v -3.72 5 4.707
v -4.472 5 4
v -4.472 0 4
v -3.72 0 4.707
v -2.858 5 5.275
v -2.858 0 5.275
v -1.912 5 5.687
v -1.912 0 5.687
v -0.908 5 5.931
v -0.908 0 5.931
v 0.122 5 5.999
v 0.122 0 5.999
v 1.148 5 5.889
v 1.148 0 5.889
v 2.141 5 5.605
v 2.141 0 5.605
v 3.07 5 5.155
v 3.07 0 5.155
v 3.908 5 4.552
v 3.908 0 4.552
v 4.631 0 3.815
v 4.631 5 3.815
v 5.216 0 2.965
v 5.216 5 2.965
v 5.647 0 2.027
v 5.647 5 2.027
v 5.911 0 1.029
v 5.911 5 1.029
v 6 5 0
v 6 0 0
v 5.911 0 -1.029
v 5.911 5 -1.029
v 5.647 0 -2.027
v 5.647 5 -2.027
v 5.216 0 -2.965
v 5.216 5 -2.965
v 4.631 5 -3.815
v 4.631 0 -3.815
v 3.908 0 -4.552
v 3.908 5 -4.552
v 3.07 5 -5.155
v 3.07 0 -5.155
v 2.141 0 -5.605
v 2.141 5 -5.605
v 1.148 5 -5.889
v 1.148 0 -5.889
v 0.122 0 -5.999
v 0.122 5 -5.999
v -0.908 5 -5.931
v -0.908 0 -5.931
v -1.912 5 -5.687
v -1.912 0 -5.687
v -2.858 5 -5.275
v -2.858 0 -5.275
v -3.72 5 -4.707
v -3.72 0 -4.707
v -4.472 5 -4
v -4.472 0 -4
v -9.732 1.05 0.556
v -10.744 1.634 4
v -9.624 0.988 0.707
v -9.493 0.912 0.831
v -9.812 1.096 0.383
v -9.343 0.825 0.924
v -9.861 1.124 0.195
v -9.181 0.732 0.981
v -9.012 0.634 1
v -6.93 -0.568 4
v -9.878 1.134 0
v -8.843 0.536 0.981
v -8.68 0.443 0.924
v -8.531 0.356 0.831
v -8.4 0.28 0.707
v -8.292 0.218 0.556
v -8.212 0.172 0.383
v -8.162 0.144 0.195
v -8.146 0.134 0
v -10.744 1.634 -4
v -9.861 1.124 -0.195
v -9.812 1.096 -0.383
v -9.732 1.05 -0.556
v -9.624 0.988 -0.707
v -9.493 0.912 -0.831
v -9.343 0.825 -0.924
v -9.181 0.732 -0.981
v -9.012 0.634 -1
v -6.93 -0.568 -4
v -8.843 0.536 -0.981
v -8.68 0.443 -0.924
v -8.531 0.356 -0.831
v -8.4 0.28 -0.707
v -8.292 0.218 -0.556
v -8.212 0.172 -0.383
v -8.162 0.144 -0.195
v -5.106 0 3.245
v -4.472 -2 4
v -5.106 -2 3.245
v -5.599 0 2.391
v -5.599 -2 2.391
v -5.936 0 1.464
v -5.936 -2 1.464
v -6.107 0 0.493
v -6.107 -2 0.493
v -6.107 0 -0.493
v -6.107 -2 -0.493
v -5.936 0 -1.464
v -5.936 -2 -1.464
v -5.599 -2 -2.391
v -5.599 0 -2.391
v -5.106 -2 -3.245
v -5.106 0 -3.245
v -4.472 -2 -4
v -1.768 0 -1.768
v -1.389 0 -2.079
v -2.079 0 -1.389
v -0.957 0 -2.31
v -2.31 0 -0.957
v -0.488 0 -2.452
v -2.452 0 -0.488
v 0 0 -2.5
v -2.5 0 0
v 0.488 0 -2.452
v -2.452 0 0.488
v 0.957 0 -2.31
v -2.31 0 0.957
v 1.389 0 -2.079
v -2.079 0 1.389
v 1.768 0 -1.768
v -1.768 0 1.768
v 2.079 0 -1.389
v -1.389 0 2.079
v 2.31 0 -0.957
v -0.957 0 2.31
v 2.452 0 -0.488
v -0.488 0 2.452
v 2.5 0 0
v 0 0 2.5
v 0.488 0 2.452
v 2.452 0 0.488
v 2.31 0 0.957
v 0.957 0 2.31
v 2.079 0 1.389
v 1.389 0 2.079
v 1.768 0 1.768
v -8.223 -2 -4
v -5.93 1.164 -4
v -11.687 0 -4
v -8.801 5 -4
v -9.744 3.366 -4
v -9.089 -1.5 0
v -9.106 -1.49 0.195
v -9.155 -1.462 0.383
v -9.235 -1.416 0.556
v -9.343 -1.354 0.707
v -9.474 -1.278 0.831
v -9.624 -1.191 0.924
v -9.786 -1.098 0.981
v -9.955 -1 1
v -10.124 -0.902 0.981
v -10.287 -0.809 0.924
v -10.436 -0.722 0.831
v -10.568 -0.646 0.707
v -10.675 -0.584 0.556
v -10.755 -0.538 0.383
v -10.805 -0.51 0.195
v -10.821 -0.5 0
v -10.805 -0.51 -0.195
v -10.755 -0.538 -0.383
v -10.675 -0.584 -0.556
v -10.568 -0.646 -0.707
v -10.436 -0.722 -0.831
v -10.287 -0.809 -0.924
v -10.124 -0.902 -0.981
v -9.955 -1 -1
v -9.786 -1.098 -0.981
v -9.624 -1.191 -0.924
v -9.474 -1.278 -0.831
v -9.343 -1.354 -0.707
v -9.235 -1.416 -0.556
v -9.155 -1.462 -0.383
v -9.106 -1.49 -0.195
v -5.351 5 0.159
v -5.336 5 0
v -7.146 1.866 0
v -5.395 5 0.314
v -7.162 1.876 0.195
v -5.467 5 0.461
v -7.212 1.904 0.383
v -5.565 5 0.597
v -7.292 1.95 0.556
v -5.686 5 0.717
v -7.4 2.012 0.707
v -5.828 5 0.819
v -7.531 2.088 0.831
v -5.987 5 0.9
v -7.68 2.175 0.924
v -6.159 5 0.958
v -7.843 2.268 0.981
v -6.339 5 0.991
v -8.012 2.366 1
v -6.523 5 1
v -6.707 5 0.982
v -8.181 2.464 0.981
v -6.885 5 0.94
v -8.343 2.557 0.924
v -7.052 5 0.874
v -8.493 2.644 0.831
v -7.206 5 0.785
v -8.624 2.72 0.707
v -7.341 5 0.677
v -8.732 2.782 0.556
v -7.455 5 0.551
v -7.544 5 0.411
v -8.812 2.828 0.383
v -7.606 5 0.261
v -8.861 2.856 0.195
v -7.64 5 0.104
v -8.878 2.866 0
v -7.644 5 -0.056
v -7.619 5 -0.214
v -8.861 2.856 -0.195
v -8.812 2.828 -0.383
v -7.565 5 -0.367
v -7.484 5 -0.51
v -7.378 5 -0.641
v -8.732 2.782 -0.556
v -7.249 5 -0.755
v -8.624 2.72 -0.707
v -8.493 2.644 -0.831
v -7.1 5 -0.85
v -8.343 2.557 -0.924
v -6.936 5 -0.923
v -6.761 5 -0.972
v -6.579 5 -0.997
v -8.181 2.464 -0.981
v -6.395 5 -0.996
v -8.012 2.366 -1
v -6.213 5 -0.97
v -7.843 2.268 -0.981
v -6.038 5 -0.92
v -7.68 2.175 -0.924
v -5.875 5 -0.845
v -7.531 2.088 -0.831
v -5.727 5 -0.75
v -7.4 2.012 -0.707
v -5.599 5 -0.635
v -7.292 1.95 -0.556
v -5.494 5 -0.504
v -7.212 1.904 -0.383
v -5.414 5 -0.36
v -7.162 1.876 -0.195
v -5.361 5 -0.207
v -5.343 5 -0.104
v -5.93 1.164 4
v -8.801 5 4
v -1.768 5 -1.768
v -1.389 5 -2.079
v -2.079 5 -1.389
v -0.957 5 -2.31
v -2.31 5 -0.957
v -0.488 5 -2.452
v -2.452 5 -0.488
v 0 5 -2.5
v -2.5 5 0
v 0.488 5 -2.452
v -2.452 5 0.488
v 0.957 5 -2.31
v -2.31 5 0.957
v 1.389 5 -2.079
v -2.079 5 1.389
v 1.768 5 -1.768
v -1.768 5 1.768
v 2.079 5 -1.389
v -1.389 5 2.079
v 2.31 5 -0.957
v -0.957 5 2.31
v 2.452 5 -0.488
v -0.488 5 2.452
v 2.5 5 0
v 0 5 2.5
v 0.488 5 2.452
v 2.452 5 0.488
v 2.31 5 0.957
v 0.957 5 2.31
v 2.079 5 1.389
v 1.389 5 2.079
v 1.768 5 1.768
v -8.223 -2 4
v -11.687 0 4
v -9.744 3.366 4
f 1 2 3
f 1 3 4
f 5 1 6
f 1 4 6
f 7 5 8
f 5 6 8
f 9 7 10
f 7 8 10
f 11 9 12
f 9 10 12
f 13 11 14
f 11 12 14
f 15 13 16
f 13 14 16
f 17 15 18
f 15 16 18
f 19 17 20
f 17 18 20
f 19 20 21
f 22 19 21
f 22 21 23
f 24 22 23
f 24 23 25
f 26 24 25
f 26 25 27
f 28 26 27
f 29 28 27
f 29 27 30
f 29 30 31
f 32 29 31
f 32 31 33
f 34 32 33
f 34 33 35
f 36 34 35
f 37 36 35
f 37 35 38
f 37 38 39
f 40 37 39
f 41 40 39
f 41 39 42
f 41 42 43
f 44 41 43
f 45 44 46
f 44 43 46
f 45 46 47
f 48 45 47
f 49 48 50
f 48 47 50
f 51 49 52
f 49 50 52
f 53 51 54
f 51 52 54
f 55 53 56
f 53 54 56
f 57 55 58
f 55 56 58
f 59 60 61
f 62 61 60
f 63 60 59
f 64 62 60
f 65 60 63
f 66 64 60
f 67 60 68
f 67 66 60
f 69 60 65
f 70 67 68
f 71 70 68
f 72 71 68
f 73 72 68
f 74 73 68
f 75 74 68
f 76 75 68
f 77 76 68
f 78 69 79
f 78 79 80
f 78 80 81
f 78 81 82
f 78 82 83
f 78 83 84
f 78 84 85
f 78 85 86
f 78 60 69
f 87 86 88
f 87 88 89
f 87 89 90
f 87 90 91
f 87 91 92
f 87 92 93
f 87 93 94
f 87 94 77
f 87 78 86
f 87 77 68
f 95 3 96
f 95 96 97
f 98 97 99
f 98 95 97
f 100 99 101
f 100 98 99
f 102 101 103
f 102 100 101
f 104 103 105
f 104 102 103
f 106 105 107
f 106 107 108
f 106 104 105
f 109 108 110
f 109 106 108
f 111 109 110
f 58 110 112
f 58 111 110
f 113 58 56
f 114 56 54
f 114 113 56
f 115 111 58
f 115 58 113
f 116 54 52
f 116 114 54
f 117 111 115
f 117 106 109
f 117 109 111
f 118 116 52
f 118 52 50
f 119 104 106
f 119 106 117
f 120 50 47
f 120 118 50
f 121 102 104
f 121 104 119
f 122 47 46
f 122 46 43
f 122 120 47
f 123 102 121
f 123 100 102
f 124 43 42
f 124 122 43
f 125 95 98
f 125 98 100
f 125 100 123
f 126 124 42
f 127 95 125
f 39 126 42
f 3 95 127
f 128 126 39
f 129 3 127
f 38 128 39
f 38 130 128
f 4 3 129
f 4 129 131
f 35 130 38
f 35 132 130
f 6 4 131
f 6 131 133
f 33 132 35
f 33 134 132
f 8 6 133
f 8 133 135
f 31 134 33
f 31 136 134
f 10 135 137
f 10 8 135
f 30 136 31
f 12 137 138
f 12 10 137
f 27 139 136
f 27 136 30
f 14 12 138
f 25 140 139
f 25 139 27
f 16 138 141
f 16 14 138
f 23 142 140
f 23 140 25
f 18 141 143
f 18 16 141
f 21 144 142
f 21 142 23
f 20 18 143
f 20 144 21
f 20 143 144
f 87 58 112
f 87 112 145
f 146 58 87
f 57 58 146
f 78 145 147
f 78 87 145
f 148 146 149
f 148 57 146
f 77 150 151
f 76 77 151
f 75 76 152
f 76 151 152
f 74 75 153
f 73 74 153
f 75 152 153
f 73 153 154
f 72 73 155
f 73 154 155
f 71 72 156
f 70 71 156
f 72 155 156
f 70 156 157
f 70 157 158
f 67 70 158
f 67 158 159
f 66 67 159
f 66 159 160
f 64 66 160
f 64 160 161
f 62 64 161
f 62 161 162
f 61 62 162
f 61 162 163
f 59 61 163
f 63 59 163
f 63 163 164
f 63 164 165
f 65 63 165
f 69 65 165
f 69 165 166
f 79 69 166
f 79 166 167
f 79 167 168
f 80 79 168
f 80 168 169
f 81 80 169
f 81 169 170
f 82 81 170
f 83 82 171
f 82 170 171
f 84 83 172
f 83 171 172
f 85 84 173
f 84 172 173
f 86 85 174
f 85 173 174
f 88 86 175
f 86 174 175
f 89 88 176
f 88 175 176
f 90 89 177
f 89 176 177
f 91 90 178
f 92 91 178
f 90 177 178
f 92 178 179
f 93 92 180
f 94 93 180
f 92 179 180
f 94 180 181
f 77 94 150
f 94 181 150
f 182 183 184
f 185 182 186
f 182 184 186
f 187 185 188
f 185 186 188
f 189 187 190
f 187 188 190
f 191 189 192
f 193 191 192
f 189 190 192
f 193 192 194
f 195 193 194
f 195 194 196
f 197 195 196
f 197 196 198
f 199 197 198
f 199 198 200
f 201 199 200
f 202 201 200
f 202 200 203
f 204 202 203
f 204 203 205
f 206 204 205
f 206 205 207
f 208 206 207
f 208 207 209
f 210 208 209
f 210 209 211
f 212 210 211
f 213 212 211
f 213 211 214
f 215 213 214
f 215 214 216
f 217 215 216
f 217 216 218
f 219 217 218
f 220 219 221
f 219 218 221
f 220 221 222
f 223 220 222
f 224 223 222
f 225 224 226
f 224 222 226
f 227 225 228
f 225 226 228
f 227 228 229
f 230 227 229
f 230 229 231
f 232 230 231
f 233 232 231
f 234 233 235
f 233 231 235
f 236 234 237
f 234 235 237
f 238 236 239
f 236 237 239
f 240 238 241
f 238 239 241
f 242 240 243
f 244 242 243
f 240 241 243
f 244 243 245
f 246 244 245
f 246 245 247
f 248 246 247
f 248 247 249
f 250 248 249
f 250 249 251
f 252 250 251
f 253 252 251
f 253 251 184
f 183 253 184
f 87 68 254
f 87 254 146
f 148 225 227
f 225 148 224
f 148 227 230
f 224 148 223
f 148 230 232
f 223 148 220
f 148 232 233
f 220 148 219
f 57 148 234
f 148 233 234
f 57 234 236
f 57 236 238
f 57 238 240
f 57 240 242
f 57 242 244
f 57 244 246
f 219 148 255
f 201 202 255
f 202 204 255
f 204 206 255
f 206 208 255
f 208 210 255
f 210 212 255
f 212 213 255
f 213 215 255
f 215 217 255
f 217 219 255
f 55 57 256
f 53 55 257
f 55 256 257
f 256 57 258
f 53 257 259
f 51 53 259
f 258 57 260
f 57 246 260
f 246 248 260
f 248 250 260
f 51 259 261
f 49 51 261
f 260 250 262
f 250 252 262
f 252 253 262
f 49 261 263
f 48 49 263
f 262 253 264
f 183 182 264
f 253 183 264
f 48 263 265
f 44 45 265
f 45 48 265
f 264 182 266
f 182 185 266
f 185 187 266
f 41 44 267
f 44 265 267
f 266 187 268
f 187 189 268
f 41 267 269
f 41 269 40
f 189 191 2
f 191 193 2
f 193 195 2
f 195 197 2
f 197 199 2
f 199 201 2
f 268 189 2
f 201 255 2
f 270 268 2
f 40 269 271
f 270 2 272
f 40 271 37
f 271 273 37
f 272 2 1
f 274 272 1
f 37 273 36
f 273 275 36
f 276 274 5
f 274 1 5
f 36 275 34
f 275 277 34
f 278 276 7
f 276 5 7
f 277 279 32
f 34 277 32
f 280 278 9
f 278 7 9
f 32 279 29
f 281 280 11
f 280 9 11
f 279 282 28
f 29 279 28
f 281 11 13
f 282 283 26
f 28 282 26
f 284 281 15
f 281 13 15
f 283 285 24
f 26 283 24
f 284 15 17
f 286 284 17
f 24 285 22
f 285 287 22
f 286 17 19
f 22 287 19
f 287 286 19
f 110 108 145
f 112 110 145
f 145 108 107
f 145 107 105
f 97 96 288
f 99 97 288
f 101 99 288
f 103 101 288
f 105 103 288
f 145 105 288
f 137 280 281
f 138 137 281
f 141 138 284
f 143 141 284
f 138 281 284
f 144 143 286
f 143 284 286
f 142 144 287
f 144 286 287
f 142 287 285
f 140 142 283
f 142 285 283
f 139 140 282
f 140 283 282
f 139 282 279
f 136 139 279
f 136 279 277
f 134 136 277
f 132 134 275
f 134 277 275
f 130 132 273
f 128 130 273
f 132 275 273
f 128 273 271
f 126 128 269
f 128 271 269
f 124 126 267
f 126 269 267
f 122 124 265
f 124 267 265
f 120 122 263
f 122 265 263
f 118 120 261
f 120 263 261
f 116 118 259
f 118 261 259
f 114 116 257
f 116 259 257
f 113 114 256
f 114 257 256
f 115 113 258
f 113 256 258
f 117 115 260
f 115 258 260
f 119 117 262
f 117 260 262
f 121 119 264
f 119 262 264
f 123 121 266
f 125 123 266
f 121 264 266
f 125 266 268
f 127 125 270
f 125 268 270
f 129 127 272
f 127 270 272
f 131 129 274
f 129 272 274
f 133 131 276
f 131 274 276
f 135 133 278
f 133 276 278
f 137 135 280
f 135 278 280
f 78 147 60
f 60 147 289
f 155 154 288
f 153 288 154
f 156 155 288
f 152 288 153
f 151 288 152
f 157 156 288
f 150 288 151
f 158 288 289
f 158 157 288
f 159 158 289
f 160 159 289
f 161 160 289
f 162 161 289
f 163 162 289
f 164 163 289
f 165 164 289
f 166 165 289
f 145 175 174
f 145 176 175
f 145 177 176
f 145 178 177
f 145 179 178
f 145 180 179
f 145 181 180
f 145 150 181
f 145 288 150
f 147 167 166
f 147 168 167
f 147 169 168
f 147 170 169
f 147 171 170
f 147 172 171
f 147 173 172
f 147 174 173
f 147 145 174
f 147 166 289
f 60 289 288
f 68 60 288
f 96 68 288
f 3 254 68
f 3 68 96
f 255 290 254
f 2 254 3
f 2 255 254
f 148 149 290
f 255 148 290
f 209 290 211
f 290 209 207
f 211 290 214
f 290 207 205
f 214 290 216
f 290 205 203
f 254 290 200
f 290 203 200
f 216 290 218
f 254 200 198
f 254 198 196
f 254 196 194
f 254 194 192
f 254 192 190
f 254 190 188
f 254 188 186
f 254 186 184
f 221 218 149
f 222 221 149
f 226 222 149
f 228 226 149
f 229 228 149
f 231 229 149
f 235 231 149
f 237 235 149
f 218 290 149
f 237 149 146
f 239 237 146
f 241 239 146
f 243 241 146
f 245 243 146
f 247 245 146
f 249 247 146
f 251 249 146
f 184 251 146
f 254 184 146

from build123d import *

# Parameters (mm, degrees)
SKETCH_2_R               = 6
EXTRUDE_1_DEPTH          = 5
SKETCH_3_R               = 2.5
CUT_EXTRUDE_1_DEPTH      = 5
SKETCH_4_W               = 8.617209121
SKETCH_4_H               = 5
EXTRUDE_2_DEPTH          = 4
SKETCH_5_W               = 17.690730237
SKETCH_5_H               = 8.258947269
CUT_EXTRUDE_3_DEPTH      = 4.5
EXTRUDE_5_DEPTH          = 2
CUT_EXTRUDE_7_DEPTH      = 1
CUT_EXTRUDE_7_DEPTH_BACK = 1
SKETCH_10_W              = 4.403388768
SKETCH_10_H              = 8
CUT_EXTRUDE_8_DEPTH      = 4
SKETCH_15_R              = 1
CUT_EXTRUDE_9_DEPTH      = 8


with BuildPart() as part:
    # 草图2 → 凸台-拉伸1 (new body)
    with BuildSketch(Plane(origin=(0, 0, 0), x_dir=(1, 0, 0), z_dir=(0, 1, 0))):
        with Locations(Location((0, 0, 0), (0, 0, 270))):
            Circle(SKETCH_2_R)
    extrude(amount=EXTRUDE_1_DEPTH)

    # 草图3 → 切除-拉伸1 (cut)
    with BuildSketch(Plane(origin=(0, 5, 0), x_dir=(1, 0, 0), z_dir=(0, 1, 0))):
        with Locations(Location((0, 0, 0), (0, 0, 270))):
            Circle(SKETCH_3_R)
    extrude(amount=-CUT_EXTRUDE_1_DEPTH, mode=Mode.SUBTRACT)

    # 草图4 → 凸台-拉伸2 (add, symmetric)
    with BuildSketch(Plane.XY):
        with Locations((-7.378700456, 2.5)):
            Rectangle(SKETCH_4_W, SKETCH_4_H)
    extrude(amount=EXTRUDE_2_DEPTH, both=True)

    # 草图5 → 切除-拉伸3 (cut)
    with BuildSketch(Plane(origin=(-8.765478763, 5.060751523, 0), x_dir=(0, 0, 1), z_dir=(0.8660254037844398, -0.499999999999998, 0))):
        with Locations((1.152187915, 4.129473635)):
            Rectangle(SKETCH_5_W, SKETCH_5_H)
    extrude(amount=-CUT_EXTRUDE_3_DEPTH, mode=Mode.SUBTRACT)

    # 草图12 → 凸台-拉伸5 (add)
    with BuildSketch(Plane.XZ):
        with BuildLine():
            Line((-11.687305017, 4), (-4.472135955, 4))
            ThreePointArc((-4.472135955, 4), (-6.128990204, 0), (-4.472135955, -4))
            Line((-4.472135955, -4), (-11.687305017, -4))
            Line((-11.687305017, -4), (-11.687305017, 4))
        make_face()
    extrude(amount=EXTRUDE_5_DEPTH)

    # 草图10 → 切除-拉伸7 (cut, two sides: drawn at the far end of the back side and taken through both)
    with BuildSketch(Plane(origin=(-1.478450581, -2.560751523, 0), x_dir=(0.8660254037844398, -0.49999999999999806, 0), z_dir=(0.499999999999998, 0.8660254037844397, 0)).offset(-CUT_EXTRUDE_7_DEPTH_BACK)):
        with Locations((-7.919808662, 0)):
            Rectangle(SKETCH_10_W, SKETCH_10_H)
    extrude(amount=CUT_EXTRUDE_7_DEPTH + CUT_EXTRUDE_7_DEPTH_BACK, mode=Mode.SUBTRACT)

    # 草图14 → 切除-拉伸8 (cut)
    with BuildSketch(Plane(origin=(-2.921826254, -5.060751523, 0), x_dir=(0.8660254037844398, -0.499999999999998, 0), z_dir=(0.49999999999999806, 0.8660254037844399, 0))):
        Polygon((-9.121503046, 4), (-5.535941973, 4), (-5.535941973, -4), (-9.121503046, -4), (-10.121503046, -4), (-10.121503046, 4), align=None)
    extrude(amount=-CUT_EXTRUDE_8_DEPTH, mode=Mode.SUBTRACT)

    # 草图15 → 切除-拉伸9 (cut)
    with BuildSketch(Plane(origin=(-2.921826254, -5.060751523, 0), x_dir=(0.8660254037844397, -0.4999999999999983, 0), z_dir=(-0.4999999999999982, -0.8660254037844396, 0))):
        with Locations((-8.121503046, 0)):
            Circle(SKETCH_15_R)
    extrude(amount=-CUT_EXTRUDE_9_DEPTH, mode=Mode.SUBTRACT)


solid = part.part
